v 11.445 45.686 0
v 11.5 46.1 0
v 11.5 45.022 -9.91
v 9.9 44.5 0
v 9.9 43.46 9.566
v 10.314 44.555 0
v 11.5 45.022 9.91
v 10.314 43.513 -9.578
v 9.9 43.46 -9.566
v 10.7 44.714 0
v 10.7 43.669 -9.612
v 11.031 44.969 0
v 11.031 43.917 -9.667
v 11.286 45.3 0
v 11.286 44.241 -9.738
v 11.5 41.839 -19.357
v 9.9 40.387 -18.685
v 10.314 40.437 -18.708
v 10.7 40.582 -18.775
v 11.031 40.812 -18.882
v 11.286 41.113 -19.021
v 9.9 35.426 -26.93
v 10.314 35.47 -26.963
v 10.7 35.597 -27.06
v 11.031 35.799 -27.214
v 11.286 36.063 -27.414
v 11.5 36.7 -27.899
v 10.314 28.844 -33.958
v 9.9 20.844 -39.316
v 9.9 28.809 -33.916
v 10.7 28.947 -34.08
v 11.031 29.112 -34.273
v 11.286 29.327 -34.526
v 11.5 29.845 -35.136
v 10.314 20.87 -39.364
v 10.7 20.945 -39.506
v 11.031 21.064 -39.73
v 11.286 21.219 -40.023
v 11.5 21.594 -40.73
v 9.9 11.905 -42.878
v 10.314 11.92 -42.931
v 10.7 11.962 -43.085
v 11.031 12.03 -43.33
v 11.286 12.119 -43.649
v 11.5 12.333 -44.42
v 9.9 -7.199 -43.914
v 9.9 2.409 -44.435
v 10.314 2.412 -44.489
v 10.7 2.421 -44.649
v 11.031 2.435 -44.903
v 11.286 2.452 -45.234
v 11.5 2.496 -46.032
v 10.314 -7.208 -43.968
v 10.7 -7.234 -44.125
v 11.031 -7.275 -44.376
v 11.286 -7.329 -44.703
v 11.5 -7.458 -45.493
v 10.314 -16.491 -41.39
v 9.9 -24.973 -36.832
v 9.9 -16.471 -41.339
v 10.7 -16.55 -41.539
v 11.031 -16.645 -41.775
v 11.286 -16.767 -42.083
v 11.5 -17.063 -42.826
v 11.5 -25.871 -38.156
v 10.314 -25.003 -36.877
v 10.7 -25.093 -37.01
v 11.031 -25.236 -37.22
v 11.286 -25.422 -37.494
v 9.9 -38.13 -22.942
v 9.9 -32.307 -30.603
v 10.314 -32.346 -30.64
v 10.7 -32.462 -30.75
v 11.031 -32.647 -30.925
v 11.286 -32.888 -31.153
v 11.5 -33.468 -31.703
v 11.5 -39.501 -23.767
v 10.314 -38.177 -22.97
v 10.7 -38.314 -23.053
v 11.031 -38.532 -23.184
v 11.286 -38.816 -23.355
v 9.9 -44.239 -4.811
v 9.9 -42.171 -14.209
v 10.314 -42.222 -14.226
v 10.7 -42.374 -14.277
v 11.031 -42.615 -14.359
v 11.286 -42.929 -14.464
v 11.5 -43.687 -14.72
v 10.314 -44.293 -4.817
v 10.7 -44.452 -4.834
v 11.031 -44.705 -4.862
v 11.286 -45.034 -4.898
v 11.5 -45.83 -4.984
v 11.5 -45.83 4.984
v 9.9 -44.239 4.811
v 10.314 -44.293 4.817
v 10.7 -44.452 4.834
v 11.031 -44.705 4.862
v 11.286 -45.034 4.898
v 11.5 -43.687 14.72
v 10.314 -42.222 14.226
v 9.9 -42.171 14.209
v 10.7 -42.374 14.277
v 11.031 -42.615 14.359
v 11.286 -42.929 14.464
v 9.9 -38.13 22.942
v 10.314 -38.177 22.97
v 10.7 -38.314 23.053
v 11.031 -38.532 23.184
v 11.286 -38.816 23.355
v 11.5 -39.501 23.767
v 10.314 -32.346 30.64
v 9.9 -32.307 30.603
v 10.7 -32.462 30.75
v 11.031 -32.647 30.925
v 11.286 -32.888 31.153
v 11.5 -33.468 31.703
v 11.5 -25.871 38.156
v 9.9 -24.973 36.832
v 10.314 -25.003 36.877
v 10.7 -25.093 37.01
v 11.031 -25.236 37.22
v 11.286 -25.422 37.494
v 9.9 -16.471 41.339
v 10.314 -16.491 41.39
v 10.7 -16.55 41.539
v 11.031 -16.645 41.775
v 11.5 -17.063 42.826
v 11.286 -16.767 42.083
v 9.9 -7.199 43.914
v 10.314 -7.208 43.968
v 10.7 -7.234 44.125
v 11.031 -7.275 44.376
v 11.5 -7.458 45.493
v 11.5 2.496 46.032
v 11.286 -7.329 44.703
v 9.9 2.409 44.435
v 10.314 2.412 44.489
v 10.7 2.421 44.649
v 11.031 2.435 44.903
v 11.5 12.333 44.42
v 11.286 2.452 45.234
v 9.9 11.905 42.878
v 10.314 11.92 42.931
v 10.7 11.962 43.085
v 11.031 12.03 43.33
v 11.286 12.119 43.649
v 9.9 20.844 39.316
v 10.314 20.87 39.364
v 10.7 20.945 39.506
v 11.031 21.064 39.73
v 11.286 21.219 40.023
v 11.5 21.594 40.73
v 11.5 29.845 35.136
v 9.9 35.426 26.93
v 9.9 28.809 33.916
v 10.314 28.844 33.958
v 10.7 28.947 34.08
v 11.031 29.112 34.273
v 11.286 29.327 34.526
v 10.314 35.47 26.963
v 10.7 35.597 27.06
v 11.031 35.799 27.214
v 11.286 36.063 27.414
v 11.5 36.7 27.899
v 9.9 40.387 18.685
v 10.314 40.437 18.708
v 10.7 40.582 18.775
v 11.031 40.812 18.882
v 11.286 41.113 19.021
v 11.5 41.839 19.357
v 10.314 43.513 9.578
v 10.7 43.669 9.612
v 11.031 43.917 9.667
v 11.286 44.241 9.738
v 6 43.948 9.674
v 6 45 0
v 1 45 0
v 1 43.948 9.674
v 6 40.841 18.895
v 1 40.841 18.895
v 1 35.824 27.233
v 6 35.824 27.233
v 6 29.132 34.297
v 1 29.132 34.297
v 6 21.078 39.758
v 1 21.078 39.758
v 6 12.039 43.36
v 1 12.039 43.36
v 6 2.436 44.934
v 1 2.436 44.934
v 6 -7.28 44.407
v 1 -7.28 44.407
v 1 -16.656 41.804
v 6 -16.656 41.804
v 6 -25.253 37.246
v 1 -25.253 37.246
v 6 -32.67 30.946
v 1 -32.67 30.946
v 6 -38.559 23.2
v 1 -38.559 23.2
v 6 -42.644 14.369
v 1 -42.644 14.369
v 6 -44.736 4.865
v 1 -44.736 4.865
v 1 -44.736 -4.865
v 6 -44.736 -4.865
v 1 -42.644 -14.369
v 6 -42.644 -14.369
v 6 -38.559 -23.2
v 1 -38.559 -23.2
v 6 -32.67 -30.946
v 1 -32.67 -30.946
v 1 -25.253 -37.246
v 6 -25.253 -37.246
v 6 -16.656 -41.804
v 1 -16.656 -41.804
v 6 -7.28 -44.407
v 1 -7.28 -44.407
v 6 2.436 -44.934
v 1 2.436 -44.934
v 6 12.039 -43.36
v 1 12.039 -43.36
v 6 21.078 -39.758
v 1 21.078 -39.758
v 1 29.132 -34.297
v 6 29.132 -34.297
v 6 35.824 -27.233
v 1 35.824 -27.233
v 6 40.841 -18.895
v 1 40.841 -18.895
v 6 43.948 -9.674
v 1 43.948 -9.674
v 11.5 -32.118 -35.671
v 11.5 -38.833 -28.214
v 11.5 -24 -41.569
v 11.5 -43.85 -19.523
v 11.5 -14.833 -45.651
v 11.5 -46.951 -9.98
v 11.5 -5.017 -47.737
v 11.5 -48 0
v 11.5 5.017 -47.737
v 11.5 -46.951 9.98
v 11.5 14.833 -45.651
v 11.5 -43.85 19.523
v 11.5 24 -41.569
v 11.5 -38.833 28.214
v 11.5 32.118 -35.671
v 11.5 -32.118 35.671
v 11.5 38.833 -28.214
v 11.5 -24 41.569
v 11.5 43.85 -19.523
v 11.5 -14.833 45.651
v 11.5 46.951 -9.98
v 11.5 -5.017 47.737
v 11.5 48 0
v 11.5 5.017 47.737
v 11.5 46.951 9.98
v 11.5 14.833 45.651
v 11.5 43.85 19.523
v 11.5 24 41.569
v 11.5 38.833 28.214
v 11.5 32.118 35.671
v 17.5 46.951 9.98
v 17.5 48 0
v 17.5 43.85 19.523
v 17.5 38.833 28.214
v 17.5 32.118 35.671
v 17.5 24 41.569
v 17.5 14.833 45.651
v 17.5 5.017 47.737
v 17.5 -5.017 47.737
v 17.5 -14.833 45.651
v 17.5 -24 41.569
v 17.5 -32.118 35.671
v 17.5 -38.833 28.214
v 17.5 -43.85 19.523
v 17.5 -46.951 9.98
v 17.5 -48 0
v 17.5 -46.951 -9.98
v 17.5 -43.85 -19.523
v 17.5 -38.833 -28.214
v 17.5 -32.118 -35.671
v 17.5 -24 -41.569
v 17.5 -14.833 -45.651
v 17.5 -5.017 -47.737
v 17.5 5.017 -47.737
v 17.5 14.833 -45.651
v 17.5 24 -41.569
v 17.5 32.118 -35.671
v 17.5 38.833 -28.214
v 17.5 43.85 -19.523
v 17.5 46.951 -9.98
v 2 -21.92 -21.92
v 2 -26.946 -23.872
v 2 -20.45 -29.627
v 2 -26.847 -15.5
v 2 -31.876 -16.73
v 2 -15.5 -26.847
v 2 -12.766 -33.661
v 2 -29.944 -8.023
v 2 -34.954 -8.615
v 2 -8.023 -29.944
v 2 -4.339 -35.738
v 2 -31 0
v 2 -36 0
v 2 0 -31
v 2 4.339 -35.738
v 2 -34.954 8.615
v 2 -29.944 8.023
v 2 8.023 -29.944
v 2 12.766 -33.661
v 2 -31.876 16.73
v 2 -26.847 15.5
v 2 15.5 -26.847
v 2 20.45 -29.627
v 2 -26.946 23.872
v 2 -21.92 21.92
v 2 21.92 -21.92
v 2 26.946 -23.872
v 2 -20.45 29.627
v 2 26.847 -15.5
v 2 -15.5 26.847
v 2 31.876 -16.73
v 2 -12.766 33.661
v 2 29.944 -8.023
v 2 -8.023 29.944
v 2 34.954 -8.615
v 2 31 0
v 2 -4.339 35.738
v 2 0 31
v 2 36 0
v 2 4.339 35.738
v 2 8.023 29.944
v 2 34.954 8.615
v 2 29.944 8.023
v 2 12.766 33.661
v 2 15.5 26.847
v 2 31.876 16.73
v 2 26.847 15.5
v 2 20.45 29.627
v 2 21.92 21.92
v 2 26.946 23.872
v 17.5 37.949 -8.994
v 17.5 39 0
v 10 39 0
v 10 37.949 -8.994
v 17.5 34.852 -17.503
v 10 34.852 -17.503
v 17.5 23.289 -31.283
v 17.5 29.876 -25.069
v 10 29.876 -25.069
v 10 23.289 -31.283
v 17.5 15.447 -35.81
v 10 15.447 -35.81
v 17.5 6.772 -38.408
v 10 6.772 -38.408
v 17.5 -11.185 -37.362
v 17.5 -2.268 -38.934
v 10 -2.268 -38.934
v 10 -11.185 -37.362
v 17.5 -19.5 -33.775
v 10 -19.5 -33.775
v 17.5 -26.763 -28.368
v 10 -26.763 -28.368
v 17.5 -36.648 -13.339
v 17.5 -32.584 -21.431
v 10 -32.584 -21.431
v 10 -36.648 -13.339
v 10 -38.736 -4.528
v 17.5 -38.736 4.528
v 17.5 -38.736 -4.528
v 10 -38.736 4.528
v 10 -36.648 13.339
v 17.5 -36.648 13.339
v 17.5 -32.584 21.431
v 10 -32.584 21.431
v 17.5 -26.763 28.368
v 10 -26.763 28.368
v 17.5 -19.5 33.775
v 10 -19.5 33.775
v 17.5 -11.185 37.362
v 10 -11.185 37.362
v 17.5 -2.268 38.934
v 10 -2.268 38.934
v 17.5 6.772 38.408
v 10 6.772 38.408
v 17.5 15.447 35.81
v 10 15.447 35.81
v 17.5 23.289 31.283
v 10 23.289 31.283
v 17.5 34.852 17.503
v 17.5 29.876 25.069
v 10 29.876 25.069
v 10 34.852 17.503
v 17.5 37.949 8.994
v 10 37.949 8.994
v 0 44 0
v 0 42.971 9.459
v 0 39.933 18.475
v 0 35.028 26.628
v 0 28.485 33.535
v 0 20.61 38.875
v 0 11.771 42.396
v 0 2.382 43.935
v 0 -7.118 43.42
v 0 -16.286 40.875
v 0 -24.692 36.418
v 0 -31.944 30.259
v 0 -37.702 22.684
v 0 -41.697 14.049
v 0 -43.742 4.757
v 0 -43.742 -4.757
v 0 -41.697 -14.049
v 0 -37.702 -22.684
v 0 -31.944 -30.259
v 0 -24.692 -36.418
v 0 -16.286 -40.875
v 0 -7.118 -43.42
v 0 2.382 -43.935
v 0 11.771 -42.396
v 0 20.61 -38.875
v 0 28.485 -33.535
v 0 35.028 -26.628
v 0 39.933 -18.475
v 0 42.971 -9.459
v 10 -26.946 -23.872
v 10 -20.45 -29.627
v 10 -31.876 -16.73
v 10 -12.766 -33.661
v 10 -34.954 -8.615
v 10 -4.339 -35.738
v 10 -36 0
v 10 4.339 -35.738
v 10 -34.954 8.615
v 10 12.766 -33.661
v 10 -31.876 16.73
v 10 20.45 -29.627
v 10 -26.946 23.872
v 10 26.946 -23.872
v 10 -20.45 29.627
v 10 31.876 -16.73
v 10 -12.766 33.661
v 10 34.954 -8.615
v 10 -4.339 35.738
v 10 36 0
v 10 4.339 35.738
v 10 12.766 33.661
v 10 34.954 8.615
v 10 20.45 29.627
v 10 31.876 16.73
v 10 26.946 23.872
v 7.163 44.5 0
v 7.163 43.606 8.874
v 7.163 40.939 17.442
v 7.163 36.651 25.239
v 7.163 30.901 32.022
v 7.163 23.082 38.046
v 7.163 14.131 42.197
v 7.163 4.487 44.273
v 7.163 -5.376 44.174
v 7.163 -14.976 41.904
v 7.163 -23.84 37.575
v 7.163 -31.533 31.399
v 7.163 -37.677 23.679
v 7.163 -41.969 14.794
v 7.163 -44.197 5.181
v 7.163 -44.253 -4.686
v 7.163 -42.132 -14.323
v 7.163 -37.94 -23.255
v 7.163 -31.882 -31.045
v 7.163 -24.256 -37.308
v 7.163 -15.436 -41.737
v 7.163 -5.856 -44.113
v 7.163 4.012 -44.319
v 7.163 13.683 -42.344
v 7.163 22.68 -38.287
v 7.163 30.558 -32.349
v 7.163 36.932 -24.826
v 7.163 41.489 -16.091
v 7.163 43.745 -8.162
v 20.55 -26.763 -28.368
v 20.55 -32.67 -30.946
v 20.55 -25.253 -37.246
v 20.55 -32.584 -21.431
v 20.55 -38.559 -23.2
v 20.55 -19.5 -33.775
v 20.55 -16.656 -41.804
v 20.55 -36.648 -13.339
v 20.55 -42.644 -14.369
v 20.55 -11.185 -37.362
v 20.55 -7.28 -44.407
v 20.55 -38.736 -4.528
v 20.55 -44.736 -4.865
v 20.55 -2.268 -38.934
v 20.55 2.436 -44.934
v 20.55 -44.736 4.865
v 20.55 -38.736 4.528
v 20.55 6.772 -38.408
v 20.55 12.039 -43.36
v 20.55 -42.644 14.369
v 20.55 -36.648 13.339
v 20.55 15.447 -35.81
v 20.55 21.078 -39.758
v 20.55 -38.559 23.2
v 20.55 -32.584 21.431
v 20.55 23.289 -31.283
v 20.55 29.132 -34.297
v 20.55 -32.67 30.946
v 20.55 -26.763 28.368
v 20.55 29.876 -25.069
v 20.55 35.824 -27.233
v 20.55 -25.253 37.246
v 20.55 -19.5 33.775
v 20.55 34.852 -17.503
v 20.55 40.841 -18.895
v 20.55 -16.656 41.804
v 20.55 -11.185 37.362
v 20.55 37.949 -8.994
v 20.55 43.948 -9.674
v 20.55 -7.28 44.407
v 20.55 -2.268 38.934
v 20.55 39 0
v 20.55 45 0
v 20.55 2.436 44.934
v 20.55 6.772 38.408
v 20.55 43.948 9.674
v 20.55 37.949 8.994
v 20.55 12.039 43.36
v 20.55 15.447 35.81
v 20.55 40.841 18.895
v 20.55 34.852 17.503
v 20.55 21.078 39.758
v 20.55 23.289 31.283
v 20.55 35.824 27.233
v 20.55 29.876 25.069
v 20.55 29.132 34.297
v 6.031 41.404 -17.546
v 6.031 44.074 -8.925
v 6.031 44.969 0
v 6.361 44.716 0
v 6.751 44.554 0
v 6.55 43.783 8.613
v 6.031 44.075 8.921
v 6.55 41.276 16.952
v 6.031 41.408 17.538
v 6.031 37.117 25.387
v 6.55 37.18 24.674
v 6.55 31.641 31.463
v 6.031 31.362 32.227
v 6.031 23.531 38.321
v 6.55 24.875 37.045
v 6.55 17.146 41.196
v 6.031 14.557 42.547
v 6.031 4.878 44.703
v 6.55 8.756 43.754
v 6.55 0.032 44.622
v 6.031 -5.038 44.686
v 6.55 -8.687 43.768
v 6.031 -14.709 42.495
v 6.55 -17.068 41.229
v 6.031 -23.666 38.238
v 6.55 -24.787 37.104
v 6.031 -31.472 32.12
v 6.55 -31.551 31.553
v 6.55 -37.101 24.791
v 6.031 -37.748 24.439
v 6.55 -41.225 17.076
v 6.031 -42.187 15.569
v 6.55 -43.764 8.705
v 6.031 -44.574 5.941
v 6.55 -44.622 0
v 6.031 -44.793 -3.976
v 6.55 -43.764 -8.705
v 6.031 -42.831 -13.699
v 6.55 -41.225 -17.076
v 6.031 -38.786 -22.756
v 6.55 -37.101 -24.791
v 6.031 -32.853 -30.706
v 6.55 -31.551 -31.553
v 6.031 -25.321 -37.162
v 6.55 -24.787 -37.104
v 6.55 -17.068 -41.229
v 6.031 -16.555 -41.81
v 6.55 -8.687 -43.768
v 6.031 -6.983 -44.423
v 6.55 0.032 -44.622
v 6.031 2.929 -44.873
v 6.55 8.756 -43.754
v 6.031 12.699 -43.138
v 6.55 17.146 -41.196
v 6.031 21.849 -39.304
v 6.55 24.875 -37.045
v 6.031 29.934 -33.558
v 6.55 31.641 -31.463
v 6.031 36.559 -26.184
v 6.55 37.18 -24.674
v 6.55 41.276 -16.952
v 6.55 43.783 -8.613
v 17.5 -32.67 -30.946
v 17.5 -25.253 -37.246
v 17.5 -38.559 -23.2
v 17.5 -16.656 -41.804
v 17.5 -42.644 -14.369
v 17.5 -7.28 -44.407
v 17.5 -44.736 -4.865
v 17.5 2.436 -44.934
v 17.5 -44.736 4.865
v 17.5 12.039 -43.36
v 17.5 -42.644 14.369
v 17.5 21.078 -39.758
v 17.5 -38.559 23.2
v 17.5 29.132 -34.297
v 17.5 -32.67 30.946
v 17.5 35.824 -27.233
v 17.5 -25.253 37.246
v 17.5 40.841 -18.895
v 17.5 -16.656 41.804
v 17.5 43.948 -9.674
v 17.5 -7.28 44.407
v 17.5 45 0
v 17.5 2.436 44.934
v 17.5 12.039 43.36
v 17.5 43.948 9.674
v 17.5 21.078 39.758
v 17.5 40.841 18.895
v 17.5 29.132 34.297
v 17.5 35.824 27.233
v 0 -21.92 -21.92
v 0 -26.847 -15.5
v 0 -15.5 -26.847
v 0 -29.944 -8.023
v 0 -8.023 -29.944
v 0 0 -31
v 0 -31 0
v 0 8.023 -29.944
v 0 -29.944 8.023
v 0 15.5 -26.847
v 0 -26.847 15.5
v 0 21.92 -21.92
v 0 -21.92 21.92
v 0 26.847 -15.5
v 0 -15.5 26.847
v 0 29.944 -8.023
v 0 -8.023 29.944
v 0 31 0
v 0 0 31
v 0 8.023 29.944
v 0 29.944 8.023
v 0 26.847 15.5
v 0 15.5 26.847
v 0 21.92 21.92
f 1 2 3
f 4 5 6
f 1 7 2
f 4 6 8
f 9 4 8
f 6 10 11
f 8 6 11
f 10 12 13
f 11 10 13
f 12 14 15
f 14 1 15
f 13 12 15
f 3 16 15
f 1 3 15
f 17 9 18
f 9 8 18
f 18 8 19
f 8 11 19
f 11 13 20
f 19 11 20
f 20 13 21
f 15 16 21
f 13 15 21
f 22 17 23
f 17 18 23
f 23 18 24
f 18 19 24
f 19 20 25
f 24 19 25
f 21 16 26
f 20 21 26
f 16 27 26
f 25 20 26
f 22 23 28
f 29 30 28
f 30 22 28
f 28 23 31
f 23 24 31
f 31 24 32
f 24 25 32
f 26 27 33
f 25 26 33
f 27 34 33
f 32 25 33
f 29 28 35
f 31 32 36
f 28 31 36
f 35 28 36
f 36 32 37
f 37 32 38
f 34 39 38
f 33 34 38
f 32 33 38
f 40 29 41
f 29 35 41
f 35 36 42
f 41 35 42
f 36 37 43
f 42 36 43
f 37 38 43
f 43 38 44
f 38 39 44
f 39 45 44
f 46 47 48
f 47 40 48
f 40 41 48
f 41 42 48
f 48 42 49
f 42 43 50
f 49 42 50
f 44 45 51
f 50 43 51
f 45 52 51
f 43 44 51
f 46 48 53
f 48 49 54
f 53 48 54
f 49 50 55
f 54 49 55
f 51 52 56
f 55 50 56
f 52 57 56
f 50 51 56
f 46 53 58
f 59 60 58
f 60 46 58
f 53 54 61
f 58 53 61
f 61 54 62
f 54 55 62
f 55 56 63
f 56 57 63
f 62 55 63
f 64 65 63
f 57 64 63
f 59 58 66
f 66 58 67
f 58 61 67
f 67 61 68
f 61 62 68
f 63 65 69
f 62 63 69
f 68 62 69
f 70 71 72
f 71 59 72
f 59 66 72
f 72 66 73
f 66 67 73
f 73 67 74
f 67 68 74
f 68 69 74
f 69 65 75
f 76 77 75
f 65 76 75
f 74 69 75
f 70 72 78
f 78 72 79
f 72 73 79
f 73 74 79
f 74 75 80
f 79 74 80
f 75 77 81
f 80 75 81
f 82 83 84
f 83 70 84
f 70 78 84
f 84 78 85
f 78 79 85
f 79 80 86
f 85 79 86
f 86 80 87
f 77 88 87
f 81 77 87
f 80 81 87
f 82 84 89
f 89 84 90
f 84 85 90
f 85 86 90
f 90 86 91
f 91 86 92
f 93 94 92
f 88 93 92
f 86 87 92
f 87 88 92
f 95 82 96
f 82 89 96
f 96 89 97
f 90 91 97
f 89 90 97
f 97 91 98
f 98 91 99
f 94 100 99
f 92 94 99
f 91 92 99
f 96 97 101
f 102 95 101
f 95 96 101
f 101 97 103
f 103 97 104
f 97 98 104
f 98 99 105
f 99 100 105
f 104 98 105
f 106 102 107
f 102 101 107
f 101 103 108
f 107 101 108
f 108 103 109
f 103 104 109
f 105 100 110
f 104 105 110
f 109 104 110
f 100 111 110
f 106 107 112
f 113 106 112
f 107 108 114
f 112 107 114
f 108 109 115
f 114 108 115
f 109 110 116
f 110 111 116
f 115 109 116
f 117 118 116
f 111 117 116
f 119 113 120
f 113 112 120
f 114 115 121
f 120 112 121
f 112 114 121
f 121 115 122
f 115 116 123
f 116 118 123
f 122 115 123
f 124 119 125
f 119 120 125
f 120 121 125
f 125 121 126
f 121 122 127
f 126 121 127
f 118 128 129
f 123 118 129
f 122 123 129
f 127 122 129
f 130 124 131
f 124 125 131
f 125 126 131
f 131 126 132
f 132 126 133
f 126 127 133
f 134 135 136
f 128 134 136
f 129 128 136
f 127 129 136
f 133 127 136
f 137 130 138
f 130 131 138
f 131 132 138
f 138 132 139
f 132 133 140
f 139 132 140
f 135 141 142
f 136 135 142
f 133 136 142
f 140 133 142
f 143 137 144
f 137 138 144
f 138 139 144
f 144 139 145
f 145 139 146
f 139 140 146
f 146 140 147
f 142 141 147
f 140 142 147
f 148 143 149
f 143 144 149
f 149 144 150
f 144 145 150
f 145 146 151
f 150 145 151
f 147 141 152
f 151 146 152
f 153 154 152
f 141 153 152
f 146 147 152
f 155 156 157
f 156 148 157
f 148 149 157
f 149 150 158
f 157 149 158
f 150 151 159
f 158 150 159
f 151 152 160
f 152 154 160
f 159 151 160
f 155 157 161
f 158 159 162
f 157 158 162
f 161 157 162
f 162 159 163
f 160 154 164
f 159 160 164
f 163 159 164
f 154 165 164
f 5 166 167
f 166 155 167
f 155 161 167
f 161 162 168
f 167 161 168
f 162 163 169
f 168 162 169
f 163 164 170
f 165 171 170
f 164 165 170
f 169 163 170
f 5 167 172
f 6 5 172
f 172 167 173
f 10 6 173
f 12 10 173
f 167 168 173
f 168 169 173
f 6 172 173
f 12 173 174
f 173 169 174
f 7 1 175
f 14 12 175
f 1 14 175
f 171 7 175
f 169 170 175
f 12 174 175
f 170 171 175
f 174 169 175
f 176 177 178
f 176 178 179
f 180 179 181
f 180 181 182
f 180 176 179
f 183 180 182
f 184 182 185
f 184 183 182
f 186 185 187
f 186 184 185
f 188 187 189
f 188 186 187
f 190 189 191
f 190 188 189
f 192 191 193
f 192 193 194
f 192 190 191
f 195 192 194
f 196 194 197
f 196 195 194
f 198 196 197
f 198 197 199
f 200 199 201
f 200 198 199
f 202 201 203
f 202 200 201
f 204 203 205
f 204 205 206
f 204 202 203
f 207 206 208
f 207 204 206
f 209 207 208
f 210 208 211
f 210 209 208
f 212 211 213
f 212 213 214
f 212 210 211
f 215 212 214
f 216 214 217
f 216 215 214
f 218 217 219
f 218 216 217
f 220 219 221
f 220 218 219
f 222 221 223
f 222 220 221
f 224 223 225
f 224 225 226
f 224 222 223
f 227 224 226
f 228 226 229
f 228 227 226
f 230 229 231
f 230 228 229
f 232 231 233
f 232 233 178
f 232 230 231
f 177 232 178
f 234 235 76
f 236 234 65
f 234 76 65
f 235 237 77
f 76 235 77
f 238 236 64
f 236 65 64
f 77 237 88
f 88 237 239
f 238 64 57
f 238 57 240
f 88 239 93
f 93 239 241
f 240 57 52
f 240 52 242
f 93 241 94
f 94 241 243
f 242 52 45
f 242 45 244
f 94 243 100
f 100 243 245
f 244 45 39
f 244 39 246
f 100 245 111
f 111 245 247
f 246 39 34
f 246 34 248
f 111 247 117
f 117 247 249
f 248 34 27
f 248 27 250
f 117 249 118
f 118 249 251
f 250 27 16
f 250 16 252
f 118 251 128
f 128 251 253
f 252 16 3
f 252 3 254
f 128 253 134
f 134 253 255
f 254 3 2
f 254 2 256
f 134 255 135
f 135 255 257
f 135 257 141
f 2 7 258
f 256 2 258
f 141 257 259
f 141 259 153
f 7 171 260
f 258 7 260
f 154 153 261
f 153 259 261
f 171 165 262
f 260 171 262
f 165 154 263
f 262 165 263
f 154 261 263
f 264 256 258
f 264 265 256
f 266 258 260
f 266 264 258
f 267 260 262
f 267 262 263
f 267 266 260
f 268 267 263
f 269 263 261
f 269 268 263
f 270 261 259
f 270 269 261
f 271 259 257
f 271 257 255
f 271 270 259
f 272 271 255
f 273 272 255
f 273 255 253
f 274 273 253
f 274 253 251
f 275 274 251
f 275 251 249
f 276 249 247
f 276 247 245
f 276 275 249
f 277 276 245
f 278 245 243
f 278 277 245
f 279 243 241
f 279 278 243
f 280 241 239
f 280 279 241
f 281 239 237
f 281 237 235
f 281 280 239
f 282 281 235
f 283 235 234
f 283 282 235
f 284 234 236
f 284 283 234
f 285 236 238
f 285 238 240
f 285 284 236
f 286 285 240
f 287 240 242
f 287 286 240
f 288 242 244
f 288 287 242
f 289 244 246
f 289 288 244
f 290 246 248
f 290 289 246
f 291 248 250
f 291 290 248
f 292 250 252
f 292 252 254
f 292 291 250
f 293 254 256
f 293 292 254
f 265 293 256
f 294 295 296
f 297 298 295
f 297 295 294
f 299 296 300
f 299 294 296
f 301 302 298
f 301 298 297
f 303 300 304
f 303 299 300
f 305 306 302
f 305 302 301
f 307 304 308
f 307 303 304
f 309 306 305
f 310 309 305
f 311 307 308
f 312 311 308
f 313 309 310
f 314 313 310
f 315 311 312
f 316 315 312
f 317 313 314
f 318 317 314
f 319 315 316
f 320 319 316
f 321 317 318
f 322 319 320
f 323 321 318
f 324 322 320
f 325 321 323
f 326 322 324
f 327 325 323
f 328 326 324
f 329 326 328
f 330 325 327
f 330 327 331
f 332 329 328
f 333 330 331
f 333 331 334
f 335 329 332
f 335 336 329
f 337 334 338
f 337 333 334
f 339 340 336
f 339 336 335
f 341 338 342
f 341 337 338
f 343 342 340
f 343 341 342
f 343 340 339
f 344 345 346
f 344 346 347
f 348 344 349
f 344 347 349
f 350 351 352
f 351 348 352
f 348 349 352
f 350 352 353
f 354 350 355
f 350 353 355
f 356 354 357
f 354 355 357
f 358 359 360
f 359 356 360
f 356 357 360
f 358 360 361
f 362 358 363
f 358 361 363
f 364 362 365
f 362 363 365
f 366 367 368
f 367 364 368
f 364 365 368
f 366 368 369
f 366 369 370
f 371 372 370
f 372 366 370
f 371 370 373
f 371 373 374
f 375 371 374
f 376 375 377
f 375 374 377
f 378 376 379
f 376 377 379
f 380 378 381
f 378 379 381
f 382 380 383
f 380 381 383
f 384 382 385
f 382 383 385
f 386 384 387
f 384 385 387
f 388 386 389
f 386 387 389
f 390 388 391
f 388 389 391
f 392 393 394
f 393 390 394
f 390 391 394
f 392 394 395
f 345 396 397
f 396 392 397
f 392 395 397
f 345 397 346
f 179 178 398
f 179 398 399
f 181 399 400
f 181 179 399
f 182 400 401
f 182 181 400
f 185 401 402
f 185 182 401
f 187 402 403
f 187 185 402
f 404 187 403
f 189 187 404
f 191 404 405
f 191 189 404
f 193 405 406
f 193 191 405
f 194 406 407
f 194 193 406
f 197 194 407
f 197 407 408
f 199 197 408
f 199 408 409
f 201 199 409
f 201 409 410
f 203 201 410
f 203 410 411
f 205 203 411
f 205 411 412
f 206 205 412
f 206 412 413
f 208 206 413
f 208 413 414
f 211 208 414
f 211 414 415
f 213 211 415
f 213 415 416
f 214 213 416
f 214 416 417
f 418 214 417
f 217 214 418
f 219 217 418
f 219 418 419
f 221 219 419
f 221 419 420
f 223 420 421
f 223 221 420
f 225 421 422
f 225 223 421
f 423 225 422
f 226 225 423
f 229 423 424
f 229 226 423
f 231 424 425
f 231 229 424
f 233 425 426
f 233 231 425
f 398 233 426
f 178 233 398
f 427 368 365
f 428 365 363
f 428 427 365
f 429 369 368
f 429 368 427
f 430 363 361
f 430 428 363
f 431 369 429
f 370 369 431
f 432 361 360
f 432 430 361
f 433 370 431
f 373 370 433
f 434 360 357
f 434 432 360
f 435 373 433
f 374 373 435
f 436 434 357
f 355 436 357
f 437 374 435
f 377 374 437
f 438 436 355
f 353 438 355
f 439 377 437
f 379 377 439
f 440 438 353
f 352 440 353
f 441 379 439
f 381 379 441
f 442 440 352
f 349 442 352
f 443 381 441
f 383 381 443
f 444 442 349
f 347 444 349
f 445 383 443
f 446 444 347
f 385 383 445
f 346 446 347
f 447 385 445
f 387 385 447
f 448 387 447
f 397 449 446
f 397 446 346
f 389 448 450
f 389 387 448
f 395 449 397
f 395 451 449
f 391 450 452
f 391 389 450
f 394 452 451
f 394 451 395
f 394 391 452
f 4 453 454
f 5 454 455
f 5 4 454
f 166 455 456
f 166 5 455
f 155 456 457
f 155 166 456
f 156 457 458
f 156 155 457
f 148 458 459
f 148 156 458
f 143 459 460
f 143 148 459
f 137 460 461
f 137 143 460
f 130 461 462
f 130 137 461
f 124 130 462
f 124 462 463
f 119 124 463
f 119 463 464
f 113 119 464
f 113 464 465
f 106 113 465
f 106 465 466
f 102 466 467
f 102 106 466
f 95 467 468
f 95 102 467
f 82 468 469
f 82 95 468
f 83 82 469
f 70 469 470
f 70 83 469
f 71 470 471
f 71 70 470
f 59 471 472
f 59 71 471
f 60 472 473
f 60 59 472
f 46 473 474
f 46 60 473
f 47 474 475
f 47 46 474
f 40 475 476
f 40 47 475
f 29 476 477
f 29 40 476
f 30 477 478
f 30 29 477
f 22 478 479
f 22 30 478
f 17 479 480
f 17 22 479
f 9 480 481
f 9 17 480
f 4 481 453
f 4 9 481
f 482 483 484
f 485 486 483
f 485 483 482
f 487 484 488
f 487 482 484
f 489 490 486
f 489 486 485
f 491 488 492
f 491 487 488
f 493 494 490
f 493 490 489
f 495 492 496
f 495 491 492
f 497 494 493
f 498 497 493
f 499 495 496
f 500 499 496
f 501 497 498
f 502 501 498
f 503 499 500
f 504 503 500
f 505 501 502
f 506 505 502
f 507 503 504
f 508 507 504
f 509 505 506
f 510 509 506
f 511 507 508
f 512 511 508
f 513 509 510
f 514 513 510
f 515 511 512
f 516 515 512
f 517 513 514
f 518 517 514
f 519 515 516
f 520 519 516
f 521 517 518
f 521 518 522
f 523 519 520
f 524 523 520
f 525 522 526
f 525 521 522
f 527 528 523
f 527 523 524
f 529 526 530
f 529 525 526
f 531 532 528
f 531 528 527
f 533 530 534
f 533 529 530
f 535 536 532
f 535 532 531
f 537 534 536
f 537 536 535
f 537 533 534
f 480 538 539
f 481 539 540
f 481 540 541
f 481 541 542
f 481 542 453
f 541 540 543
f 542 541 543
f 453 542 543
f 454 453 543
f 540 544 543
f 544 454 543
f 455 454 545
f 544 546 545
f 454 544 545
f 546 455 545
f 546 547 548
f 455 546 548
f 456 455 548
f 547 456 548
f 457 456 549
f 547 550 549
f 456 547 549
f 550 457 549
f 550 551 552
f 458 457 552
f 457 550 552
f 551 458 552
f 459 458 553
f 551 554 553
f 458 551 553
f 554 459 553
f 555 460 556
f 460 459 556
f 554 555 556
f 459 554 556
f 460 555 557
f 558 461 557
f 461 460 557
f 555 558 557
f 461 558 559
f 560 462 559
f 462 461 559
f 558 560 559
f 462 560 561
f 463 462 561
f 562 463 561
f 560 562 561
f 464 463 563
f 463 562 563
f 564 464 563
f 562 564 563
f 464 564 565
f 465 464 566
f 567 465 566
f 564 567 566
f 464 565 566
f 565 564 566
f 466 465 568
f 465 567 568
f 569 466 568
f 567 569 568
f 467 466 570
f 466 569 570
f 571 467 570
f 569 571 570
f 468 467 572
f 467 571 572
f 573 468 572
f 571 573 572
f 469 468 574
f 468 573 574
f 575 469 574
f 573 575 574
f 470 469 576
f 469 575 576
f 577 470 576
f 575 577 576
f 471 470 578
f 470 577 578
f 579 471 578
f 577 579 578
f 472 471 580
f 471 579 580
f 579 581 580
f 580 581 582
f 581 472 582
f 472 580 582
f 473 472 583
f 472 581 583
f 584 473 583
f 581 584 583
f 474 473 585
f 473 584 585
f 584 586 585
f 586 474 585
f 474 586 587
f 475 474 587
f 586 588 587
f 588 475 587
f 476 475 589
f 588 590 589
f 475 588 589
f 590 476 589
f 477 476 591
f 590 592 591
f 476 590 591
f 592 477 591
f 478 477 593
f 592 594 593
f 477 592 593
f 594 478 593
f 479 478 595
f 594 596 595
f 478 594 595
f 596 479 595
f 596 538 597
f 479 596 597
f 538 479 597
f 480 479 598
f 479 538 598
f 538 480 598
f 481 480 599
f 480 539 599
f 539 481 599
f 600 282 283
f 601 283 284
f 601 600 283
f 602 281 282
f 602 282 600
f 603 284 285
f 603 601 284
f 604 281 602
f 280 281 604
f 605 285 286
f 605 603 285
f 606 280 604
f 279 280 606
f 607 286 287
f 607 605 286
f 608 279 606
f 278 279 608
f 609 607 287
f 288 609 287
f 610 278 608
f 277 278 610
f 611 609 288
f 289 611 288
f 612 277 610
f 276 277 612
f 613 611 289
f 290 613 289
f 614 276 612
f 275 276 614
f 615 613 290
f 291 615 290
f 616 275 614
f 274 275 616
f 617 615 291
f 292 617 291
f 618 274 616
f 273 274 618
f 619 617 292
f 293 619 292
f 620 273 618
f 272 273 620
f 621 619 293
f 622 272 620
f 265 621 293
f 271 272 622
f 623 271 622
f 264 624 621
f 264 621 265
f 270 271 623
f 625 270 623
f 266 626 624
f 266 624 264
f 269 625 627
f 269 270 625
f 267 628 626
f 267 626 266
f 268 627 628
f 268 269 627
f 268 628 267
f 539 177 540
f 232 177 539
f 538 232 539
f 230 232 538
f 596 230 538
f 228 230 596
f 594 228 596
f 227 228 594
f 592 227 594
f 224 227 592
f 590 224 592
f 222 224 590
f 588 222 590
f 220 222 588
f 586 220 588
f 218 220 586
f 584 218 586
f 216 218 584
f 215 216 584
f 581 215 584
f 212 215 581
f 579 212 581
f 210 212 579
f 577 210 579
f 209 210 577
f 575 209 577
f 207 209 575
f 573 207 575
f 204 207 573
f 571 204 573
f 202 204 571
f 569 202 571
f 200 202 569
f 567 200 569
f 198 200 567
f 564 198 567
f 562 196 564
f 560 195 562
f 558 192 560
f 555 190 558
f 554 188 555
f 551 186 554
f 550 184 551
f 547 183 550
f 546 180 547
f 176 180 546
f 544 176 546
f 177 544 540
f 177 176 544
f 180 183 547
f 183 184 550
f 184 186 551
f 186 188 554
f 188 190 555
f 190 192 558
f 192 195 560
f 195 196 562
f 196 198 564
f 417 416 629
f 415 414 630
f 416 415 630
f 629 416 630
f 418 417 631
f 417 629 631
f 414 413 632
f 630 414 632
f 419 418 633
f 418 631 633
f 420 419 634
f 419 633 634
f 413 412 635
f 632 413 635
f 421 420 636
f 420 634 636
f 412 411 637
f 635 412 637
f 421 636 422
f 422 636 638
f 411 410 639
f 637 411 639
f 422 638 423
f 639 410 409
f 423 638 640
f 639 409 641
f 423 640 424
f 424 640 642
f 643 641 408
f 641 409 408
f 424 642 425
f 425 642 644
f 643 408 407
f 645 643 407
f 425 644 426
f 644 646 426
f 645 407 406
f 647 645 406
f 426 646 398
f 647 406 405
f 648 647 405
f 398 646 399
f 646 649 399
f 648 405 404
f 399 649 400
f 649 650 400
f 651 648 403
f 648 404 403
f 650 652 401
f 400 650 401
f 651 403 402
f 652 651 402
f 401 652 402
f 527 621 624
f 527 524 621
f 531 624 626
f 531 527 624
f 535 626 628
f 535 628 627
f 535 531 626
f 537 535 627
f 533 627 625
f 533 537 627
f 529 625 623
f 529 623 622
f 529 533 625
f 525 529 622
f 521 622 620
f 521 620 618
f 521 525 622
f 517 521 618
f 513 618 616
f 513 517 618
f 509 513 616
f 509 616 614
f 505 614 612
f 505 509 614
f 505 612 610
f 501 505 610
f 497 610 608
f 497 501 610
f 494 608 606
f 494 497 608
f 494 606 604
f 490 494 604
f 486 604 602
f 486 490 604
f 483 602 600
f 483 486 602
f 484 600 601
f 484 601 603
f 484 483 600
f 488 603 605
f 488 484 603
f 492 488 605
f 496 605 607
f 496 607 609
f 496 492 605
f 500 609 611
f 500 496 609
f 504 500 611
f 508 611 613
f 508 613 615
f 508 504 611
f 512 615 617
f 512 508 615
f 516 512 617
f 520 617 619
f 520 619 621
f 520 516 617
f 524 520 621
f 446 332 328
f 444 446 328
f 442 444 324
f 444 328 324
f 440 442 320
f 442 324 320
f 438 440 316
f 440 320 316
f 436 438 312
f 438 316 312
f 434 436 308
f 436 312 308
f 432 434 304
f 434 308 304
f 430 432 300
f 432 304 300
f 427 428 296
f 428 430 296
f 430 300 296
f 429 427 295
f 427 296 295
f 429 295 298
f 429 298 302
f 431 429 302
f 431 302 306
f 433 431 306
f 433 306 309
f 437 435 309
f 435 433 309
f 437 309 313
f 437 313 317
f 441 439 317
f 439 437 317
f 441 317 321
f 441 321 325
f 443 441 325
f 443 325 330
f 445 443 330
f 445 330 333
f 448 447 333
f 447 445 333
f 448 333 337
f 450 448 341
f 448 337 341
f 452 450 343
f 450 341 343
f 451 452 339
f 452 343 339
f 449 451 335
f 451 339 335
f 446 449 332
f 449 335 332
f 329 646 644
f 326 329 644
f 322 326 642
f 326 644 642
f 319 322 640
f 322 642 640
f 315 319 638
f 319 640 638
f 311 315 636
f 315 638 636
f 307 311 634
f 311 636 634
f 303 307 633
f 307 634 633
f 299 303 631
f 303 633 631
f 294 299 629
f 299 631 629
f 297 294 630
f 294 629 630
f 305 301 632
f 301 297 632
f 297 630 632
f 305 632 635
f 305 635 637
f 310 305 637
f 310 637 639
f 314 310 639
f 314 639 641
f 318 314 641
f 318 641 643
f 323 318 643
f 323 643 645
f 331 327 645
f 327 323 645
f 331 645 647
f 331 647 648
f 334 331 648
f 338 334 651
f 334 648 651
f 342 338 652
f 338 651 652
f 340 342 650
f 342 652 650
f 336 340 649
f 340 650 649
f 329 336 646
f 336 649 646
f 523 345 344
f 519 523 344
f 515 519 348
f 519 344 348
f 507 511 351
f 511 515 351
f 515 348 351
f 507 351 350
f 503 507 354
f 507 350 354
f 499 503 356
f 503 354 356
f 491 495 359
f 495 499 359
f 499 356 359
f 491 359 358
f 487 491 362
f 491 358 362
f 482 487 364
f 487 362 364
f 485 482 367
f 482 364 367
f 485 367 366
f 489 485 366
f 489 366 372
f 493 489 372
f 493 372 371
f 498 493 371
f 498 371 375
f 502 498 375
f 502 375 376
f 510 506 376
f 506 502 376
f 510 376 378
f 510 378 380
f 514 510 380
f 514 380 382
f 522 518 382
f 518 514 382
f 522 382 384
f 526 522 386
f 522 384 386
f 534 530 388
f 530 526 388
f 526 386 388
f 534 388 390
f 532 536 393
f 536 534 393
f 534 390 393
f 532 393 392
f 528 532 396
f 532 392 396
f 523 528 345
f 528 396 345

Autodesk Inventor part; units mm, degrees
ref_plane "YZ Plane" through (0, 0, 0) normal (1, 0, 0) x (0, 1, 0)
ref_plane "XZ Plane" through (0, 0, 0) normal (0, 1, 0) x (-1, 0, 0)
ref_plane "XY Plane" through (0, 0, 0) normal (0, 0, 1) x (1, 0, 0)
sketch "Эскиз1" plane through (0, 0, 0) normal (0, 0, 1) x (1, 0, 0)
  line L0 (0, 31) -> (0, 45)
  line L1 (0, 45) -> (6, 45)
  line L2 (6, 45) -> (6.5, 44.5)
  line L3 (6.5, 44.5) -> (11.5, 44.5)
  line L4 (11.5, 44.5) -> (11.5, 48)
  line L5 (11.5, 48) -> (17.5, 48)
  line L6 (17.5, 48) -> (17.5, 45)
  line L7 (17.5, 39) -> (10, 39)
  line L8 (10, 39) -> (10, 36)
  line L9 (10, 36) -> (2, 36)
  line L10 (2, 36) -> (2, 31)
  line L11 (2, 31) -> (0, 31)
  line L12 (0, 0) -> (122.1011, 0) construction
  line L13 (17.5, 45) -> (20.55, 45)
  line L14 (20.55, 45) -> (20.55, 39)
  line L15 (20.55, 39) -> (17.5, 39)
  dimension "d0" = 90
  dimension "d1" = 72
  dimension "d2" = 5
  dimension "d4" = 5
  dimension "d5" = 6
  dimension "d7" = 45
  dimension "d8" = 0.5
  dimension "d9" = 9
  dimension "d10" = 6
  dimension "d12" = 2
  dimension "d19" = 96
  dimension "d20" = 10
  dimension "d24" = 3.05
revolve "Вращение1" add sketch "Эскиз1" angle 360 about axis through (0, 0, 0) along (1, 0, 0)
fillet "Сопряжение1" radius 1.6 2 edges at (6.5, -44.5, 0) (11.5, -44.5, 0)
chamfer "Фаска1" distance 1 angle 45 2 edges at (0, -45, 0) (17.5, -39, 0)
properties part number "Крышка тих_выход"
